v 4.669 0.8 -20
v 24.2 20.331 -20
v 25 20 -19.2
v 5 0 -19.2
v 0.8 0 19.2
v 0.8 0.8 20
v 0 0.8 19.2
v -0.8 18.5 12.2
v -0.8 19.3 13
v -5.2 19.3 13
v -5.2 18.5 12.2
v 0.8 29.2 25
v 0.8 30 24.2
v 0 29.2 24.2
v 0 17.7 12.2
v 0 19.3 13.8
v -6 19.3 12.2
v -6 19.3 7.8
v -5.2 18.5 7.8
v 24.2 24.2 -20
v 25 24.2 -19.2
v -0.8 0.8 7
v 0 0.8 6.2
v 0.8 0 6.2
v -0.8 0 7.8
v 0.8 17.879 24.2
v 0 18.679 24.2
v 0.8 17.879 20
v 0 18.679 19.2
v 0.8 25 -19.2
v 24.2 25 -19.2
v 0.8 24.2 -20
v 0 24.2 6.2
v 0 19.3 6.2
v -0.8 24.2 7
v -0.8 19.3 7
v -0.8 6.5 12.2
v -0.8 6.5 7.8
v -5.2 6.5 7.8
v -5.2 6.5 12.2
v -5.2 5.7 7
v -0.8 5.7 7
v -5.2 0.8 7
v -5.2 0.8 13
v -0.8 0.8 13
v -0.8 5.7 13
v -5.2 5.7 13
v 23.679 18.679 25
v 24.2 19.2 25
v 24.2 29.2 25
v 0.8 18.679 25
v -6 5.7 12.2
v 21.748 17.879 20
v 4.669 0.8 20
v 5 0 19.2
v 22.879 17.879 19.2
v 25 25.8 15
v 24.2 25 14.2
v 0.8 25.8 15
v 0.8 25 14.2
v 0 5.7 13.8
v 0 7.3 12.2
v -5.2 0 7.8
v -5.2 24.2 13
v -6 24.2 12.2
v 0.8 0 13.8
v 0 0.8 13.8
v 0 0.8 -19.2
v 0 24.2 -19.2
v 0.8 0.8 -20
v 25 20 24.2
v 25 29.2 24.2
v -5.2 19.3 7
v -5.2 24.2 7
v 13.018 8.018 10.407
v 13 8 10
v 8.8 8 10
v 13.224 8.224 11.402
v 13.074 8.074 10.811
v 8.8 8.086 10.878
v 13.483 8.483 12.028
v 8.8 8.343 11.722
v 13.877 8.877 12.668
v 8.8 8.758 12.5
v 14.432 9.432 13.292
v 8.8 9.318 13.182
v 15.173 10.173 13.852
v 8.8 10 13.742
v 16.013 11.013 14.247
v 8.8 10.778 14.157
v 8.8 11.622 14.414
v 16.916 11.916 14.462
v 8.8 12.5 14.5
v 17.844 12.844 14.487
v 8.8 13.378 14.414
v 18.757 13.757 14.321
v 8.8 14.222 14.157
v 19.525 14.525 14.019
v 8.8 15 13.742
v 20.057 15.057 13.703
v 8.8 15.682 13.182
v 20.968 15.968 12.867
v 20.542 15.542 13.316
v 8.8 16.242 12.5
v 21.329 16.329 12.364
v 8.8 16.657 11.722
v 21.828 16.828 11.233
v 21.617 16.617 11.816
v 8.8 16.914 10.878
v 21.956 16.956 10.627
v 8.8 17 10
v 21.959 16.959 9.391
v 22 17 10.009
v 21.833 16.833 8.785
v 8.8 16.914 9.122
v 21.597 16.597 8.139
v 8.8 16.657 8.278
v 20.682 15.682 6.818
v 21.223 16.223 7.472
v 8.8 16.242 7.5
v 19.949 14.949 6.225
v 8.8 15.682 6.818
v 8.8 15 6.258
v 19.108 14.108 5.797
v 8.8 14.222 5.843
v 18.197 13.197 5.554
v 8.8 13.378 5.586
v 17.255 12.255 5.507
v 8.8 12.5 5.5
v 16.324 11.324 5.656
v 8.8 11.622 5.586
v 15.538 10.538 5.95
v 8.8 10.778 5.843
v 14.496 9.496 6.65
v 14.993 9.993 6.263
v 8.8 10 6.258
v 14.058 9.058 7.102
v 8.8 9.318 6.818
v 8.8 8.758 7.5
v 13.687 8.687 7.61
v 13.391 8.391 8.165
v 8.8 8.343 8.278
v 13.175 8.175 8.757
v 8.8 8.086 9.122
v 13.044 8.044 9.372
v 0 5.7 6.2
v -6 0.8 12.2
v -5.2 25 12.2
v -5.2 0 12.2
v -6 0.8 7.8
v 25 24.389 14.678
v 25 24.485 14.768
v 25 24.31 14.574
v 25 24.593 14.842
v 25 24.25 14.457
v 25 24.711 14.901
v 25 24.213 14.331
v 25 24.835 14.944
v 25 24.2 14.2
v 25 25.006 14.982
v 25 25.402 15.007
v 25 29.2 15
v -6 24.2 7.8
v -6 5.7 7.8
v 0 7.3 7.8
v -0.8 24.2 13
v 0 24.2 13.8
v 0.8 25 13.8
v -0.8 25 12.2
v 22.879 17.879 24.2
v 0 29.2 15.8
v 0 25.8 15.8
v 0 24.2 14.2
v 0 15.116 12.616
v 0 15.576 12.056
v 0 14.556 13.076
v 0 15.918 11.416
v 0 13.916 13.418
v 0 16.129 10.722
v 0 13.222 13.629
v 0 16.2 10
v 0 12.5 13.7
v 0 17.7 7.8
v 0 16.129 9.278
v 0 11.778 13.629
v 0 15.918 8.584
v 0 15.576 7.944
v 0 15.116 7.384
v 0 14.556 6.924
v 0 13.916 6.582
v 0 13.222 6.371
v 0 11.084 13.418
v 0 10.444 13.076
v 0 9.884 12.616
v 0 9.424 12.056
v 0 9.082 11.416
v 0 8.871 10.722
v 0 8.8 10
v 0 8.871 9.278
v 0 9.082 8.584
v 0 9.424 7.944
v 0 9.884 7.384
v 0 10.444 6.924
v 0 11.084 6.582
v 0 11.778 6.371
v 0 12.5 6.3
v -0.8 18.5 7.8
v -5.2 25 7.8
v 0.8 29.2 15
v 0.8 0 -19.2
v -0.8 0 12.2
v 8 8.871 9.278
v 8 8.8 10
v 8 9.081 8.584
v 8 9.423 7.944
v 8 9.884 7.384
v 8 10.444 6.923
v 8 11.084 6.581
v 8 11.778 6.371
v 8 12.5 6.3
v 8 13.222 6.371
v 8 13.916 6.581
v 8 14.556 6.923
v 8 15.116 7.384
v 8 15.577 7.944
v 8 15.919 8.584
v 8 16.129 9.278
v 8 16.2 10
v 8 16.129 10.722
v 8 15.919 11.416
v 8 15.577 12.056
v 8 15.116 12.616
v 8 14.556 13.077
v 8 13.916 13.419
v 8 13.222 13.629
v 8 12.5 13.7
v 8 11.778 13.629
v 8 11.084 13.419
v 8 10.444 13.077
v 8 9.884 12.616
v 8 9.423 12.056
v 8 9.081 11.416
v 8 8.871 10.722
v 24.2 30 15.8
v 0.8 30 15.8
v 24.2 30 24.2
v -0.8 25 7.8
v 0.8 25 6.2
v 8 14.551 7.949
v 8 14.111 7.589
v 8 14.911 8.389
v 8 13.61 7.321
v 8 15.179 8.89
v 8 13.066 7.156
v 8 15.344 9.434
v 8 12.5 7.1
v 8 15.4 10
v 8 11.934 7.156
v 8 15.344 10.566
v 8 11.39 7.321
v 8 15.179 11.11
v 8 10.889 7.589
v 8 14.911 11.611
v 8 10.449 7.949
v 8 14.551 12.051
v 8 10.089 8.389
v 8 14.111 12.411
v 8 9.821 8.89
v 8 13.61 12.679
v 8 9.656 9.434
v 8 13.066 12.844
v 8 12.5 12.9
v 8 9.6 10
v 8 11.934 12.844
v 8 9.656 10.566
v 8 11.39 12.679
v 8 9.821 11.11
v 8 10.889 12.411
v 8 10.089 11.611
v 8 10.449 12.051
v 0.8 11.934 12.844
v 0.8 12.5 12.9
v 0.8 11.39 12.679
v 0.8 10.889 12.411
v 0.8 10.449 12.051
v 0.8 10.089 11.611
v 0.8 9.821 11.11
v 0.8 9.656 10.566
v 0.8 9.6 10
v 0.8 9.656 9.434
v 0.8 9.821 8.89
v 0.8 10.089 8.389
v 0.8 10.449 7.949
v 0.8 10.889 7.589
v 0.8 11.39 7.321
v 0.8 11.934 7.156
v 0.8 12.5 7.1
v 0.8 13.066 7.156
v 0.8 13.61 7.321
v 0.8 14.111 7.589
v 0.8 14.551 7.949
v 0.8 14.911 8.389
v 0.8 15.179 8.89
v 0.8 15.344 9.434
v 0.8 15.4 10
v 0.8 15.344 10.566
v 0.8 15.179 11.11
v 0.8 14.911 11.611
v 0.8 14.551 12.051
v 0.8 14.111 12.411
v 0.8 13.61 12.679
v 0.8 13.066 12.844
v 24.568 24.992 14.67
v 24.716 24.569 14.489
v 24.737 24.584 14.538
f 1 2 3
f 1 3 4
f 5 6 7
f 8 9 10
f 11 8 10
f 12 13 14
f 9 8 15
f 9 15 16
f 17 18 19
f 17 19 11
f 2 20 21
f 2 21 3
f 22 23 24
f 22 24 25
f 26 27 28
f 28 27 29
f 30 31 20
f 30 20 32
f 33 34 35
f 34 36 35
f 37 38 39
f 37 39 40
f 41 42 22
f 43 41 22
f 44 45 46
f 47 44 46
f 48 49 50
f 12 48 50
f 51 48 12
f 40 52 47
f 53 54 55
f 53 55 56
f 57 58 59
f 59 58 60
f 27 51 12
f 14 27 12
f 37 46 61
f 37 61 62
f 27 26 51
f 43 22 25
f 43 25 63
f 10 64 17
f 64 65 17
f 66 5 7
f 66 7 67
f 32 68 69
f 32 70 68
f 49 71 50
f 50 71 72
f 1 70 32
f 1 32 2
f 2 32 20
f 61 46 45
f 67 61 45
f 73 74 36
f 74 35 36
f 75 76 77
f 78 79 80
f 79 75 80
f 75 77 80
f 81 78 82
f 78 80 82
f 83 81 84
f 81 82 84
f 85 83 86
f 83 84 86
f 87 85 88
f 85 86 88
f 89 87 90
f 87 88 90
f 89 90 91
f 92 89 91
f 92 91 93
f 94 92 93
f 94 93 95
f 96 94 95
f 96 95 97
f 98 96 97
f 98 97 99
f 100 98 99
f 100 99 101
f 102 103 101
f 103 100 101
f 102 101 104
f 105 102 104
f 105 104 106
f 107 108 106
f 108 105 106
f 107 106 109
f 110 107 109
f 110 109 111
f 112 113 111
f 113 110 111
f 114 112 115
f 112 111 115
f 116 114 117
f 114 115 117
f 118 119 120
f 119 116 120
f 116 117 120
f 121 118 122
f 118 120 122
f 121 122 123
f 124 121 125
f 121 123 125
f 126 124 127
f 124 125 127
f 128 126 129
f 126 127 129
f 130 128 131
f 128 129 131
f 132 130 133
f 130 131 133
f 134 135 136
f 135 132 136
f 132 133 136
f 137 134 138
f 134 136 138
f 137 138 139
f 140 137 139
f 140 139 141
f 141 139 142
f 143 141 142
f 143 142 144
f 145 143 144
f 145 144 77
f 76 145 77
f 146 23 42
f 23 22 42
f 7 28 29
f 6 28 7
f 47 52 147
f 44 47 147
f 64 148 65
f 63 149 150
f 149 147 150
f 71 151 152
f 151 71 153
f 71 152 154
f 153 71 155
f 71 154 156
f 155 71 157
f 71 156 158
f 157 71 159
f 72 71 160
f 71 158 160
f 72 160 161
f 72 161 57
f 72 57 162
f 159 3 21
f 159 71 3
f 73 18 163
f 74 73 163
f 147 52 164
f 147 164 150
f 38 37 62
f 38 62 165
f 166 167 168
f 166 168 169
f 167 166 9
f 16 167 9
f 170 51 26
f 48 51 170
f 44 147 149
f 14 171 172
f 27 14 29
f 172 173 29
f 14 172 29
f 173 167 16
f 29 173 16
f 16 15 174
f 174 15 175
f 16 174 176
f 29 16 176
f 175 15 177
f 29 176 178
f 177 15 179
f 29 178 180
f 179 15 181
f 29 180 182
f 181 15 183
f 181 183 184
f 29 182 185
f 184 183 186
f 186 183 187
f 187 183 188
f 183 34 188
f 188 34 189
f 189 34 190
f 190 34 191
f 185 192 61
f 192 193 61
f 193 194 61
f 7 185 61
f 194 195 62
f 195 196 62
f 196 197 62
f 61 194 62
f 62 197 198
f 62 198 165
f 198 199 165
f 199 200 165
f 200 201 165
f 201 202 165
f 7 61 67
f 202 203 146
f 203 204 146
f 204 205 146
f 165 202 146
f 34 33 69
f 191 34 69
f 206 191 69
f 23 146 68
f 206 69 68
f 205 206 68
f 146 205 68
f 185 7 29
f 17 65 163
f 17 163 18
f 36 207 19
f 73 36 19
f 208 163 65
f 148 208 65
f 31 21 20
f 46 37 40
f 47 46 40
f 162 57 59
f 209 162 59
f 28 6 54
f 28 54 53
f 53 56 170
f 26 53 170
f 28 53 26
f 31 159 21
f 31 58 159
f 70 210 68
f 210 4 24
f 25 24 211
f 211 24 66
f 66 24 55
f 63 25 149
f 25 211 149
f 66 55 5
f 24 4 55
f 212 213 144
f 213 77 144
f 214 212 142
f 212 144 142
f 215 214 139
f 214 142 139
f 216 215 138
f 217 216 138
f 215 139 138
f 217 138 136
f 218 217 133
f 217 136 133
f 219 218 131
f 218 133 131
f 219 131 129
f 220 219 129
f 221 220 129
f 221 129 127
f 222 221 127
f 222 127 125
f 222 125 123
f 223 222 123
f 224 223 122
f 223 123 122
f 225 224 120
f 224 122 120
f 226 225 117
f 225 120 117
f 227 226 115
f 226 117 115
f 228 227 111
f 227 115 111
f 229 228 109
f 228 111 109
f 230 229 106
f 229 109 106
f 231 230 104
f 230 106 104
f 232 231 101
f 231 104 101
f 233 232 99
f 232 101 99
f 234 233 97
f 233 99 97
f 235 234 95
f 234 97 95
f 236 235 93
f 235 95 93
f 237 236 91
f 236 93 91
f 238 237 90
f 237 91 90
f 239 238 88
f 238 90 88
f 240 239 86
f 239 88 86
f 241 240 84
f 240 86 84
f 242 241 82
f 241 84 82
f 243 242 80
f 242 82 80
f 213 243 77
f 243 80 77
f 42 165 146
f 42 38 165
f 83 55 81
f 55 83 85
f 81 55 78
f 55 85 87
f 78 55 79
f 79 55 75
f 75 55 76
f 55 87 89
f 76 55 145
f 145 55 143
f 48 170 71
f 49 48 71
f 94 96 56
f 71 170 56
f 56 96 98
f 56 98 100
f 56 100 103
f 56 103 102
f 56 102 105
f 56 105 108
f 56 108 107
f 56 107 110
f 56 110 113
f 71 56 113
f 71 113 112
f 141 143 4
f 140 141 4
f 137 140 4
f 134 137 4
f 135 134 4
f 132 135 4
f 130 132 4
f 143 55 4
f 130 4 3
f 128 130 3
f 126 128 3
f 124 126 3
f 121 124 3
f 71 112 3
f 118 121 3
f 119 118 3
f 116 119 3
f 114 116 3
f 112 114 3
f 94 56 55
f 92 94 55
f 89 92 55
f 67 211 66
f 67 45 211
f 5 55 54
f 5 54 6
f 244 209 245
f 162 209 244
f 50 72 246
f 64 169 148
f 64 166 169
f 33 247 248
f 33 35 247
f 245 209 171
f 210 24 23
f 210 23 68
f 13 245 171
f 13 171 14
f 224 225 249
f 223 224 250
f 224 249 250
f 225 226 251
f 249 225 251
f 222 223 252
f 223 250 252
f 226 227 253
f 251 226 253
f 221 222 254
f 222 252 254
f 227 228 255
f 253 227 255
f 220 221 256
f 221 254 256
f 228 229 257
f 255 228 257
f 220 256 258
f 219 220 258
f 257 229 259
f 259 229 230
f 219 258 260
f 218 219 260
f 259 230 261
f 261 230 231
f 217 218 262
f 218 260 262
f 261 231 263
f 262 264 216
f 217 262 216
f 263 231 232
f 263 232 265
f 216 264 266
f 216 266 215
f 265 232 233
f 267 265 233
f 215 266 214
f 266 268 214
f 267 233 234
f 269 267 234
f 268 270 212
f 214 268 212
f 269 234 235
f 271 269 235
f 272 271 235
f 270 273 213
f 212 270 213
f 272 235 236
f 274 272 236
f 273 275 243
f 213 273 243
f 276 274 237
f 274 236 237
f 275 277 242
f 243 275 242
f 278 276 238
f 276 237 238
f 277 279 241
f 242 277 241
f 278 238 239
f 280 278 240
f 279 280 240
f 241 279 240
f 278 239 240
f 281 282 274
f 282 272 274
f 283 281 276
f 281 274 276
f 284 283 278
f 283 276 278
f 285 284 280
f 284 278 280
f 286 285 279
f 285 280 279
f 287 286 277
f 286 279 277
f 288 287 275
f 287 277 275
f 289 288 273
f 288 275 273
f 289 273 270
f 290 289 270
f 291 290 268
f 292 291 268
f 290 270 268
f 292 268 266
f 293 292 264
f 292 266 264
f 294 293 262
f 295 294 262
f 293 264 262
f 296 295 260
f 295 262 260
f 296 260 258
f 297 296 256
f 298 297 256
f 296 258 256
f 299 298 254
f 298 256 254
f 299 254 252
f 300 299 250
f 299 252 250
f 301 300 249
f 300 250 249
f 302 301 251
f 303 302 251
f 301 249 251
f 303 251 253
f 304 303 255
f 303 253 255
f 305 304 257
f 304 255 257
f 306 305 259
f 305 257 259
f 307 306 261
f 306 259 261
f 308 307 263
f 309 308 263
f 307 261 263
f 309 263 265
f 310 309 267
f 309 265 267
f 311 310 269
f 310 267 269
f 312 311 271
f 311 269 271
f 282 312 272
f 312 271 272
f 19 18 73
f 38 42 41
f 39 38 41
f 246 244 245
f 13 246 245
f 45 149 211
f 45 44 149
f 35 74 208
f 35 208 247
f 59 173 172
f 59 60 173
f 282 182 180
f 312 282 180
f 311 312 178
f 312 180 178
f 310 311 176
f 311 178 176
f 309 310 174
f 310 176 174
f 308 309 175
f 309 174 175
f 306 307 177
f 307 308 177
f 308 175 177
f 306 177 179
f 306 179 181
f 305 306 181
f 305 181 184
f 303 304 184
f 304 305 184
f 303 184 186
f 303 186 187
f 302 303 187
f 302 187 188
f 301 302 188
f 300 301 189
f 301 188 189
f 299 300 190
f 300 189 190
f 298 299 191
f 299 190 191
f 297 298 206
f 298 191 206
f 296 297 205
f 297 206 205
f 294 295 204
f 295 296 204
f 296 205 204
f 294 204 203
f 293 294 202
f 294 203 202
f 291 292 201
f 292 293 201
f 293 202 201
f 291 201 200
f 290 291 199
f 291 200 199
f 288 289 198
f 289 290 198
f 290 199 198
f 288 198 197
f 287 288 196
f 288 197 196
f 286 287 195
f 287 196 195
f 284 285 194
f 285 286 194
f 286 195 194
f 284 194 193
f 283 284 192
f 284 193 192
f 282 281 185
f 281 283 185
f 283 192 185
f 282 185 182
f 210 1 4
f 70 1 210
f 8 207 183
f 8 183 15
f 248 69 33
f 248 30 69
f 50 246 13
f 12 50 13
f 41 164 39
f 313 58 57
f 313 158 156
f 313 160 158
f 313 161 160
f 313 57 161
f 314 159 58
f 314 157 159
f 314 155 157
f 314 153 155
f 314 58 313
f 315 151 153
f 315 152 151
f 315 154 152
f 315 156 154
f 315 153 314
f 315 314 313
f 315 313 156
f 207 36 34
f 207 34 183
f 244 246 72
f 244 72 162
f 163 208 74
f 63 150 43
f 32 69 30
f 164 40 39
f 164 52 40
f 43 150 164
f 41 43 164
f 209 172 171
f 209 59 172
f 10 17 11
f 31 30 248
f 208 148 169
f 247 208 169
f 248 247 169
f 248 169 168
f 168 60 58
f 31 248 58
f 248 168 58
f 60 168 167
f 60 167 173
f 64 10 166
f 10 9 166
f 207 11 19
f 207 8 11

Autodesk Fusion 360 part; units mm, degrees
sketch "Bracket Profile" plane through (0, 0, 0) normal (0, 0, 1) x (1, 0, 0) in component "Bracket"
  line L0 (0, 0) -> (0, 25)
  line L1 (0, 25) -> (25, 25)
  line L2 (25, 25) -> (25, 20)
  line L3 (25, 20) -> (5, 0)
  line L4 (5, 0) -> (0, 0)
  dimension "d1" = 5
  dimension "d2" = 25
  dimension "d3" = 25
  dimension "d4" = 5
extrude "Extrude1" add sketch "Bracket Profile" along normal blind 20 in component "Bracket"
sketch "Clearance Hole" plane through (0, 0, 0) normal (-1, 0, 0) x (0, -1, 0) in component "Bracket"
  line L0 (-25, 0) -> (0, 0)
  line L1 (0, 0) -> (0, 20)
  line L2 (0, 20) -> (-25, 20)
  line L3 (-25, 20) -> (-25, 0)
  line L4 (-25, 10) -> (0, 10) construction
  line L5 (-12.5, 20) -> (-12.5, 0) construction
  circle A0 centre (-12.5, 10) radius 2.9
  circle A1 centre (-12.5, 10) radius 4.5
  line L6 (0, 13) -> (-25, 13)
  line L7 (-25, 13) -> (-25, 7)
  line L8 (-25, 7) -> (0, 7)
  line L9 (0, 7) -> (0, 13)
  line L10 (0, 13) -> (-25, 7) construction
  line L11 (-25, 13) -> (0, 7) construction
  line L12 (-6.5, 13) -> (-18.5, 13)
  line L13 (-18.5, 13) -> (-18.5, 7)
  line L14 (-18.5, 7) -> (-6.5, 7)
  line L15 (-6.5, 7) -> (-6.5, 13)
  line L16 (-6.5, 13) -> (-18.5, 7) construction
  line L17 (-18.5, 13) -> (-6.5, 7) construction
  point P0 (-12.5, 10)
  point P1 (-12.5, 10)
  dimension "d9" = 5.8
  dimension "d13" = 9
  dimension "d20" = 25
  dimension "d21" = 6
  dimension "d24" = 12
  dimension "d25" = 6
extrude "Extrude3" add sketch "Clearance Hole" along normal blind 6 contours L3 L6 L7 L8 L13 | L1 L6 L8 L9 L15 in component "Bracket"
hole "Hole1" at (0, 12.5, 10) direction (1, 0, 0) diameter 5.8 end through all in component "Bracket"
extrude "Extrude2" cut sketch "Clearance Hole" against normal through all from surface at -8 contours A1 L8 L14 | A1 L6 L8 L12 L14 | A1 L6 L12 in component "Bracket"
sketch "Shelf stop" plane through (0, 25, 0) normal (0, 1, 0) x (-1, 0, 0) in component "Bracket"
  line L0 (-25, 0) -> (0, 0)
  line L1 (0, 0) -> (0, 7)
  line L2 (0, 7) -> (6, 7)
  line L3 (6, 7) -> (6, 13)
  line L4 (6, 13) -> (0, 13)
  line L5 (0, 13) -> (0, 20)
  line L6 (0, 20) -> (-25, 20)
  line L7 (-25, 20) -> (-25, 0)
  line L8 (0, 20) -> (-25, 20)
  line L9 (-25, 20) -> (-25, 15)
  line L10 (-25, 15) -> (0, 15)
  line L11 (0, 15) -> (0, 20)
  dimension "d28" = 25
  dimension "d29" = 5
extrude "Extrude5" add 1 faces at (10, 15, 0) along direction (0, 0, -1) blind 20 in component "Bracket"
extrude "Extrude4" add sketch "Shelf stop" along normal blind 5 contours L5 L6 L7 L8 L9 L10 L11 in component "Bracket"
sketch "Sketch1" plane through (0, 0, 20) normal (0, 0, 1) x (-1, 0, 0)
  line L0 (-5, 0) -> (-25, -20)
  line L1 (-25, -20) -> (-25, -30)
  line L2 (-25, -30) -> (0, -30)
  line L3 (0, -30) -> (0, 0)
  line L4 (0, 0) -> (-5, 0)
sketch "Latch Lip" plane through (0, 0, 20) normal (0, 0, 1) x (-1, 0, 0) in component "Bracket"
  line L0 (-5, 0) -> (-25, -20)
  line L1 (-25, -20) -> (-25, -30)
  line L2 (-25, -30) -> (0, -30)
  line L3 (0, -30) -> (0, 0)
  line L4 (0, 0) -> (-5, 0)
  line L5 (0, -20) -> (0, -30)
  line L6 (0, -30) -> (-25, -30)
  line L7 (-25, -30) -> (-25, -20)
  line L8 (-25, -20) -> (-22.8787, -17.8787)
  line L9 (-22.8787, -17.8787) -> (0, -17.8787)
  line L10 (0, -20) -> (0, -17.8787)
  dimension "d36" = 3
extrude "Extrude6" add sketch "Latch Lip" along normal blind 5 contours L0 L1 L2 L3 L5 L6 L7 L8 L9 L10 in component "Bracket"
chamfer "Chamfer1" distance 0.8 angle 45 11 edges at (8, 16.6955, 8.3727) (2.5, 0, 20) (13.9393, 8.9393, 20) (25, 30, 20) (12.5, 30, 15) (2.5, 0, -20) (15, 10, -20) (25, 22.5, -20) (25, 25, 25) (12.5, 30, 25) (11.4393, 17.8787, 25) 2 faces at (0, 12.5, -10.9667) (16.6667, 25, 0.6667) in component "Bracket"
chamfer "Chamfer1" distance 0.8 angle 45 8 faces at (-6, 4.3333, 11) (-6, 22.8333, 11) (-2, 2.1667, 13) (-2, 20.6667, 13) (-4, 18.5, 9) (-2, 6.5, 9) (-2, 4.3333, 7) (-2, 22.8333, 7) in component "Bracket"
component "Bracket" placed x (1, 0, 0) y (0, 1, 0) z (0, 0, 1) at (0, 0, 0)
equation "d1 = BracketLipSize"
equation "d2 = ExtrusionSize + BracketLipSize"
equation "d3 = ExtrusionSize + BracketLipSize"
equation "d4 = BracketLipSize"
equation "ExtrusionSize = 20 mm"
equation "BracketLipSize = 5 mm"
equation "d7 = ExtrusionSize"
equation "d9 = ScrewClearanceHole"
equation "ScrewClearanceHole = 5.8 mm"
equation "d11 = ScrewClearanceHole"
equation "d13 = ScrewHeadClearance"
equation "ScrewHeadClearance = 9 mm"
equation "d15 = -ExtrusionSize / 2.5"
equation "Chamfer = 0.8 mm"
equation "d18 = Chamfer"
equation "Tounge = 6 mm"
equation "d20 = ExtrusionSize + BracketLipSize"
equation "d21 = Tounge"
equation "d22 = Tounge"
equation "d24 = NutClearance"
equation "d25 = Tounge"
equation "NutClearance = 12 mm"
equation "d27 = Chamfer"
equation "d28 = ExtrusionSize + BracketLipSize"
equation "d29 = BracketLipSize"
equation "d30 = BracketLipSize"
equation "d32 = ExtrusionSize"
equation "d34 = BracketLipSize"
